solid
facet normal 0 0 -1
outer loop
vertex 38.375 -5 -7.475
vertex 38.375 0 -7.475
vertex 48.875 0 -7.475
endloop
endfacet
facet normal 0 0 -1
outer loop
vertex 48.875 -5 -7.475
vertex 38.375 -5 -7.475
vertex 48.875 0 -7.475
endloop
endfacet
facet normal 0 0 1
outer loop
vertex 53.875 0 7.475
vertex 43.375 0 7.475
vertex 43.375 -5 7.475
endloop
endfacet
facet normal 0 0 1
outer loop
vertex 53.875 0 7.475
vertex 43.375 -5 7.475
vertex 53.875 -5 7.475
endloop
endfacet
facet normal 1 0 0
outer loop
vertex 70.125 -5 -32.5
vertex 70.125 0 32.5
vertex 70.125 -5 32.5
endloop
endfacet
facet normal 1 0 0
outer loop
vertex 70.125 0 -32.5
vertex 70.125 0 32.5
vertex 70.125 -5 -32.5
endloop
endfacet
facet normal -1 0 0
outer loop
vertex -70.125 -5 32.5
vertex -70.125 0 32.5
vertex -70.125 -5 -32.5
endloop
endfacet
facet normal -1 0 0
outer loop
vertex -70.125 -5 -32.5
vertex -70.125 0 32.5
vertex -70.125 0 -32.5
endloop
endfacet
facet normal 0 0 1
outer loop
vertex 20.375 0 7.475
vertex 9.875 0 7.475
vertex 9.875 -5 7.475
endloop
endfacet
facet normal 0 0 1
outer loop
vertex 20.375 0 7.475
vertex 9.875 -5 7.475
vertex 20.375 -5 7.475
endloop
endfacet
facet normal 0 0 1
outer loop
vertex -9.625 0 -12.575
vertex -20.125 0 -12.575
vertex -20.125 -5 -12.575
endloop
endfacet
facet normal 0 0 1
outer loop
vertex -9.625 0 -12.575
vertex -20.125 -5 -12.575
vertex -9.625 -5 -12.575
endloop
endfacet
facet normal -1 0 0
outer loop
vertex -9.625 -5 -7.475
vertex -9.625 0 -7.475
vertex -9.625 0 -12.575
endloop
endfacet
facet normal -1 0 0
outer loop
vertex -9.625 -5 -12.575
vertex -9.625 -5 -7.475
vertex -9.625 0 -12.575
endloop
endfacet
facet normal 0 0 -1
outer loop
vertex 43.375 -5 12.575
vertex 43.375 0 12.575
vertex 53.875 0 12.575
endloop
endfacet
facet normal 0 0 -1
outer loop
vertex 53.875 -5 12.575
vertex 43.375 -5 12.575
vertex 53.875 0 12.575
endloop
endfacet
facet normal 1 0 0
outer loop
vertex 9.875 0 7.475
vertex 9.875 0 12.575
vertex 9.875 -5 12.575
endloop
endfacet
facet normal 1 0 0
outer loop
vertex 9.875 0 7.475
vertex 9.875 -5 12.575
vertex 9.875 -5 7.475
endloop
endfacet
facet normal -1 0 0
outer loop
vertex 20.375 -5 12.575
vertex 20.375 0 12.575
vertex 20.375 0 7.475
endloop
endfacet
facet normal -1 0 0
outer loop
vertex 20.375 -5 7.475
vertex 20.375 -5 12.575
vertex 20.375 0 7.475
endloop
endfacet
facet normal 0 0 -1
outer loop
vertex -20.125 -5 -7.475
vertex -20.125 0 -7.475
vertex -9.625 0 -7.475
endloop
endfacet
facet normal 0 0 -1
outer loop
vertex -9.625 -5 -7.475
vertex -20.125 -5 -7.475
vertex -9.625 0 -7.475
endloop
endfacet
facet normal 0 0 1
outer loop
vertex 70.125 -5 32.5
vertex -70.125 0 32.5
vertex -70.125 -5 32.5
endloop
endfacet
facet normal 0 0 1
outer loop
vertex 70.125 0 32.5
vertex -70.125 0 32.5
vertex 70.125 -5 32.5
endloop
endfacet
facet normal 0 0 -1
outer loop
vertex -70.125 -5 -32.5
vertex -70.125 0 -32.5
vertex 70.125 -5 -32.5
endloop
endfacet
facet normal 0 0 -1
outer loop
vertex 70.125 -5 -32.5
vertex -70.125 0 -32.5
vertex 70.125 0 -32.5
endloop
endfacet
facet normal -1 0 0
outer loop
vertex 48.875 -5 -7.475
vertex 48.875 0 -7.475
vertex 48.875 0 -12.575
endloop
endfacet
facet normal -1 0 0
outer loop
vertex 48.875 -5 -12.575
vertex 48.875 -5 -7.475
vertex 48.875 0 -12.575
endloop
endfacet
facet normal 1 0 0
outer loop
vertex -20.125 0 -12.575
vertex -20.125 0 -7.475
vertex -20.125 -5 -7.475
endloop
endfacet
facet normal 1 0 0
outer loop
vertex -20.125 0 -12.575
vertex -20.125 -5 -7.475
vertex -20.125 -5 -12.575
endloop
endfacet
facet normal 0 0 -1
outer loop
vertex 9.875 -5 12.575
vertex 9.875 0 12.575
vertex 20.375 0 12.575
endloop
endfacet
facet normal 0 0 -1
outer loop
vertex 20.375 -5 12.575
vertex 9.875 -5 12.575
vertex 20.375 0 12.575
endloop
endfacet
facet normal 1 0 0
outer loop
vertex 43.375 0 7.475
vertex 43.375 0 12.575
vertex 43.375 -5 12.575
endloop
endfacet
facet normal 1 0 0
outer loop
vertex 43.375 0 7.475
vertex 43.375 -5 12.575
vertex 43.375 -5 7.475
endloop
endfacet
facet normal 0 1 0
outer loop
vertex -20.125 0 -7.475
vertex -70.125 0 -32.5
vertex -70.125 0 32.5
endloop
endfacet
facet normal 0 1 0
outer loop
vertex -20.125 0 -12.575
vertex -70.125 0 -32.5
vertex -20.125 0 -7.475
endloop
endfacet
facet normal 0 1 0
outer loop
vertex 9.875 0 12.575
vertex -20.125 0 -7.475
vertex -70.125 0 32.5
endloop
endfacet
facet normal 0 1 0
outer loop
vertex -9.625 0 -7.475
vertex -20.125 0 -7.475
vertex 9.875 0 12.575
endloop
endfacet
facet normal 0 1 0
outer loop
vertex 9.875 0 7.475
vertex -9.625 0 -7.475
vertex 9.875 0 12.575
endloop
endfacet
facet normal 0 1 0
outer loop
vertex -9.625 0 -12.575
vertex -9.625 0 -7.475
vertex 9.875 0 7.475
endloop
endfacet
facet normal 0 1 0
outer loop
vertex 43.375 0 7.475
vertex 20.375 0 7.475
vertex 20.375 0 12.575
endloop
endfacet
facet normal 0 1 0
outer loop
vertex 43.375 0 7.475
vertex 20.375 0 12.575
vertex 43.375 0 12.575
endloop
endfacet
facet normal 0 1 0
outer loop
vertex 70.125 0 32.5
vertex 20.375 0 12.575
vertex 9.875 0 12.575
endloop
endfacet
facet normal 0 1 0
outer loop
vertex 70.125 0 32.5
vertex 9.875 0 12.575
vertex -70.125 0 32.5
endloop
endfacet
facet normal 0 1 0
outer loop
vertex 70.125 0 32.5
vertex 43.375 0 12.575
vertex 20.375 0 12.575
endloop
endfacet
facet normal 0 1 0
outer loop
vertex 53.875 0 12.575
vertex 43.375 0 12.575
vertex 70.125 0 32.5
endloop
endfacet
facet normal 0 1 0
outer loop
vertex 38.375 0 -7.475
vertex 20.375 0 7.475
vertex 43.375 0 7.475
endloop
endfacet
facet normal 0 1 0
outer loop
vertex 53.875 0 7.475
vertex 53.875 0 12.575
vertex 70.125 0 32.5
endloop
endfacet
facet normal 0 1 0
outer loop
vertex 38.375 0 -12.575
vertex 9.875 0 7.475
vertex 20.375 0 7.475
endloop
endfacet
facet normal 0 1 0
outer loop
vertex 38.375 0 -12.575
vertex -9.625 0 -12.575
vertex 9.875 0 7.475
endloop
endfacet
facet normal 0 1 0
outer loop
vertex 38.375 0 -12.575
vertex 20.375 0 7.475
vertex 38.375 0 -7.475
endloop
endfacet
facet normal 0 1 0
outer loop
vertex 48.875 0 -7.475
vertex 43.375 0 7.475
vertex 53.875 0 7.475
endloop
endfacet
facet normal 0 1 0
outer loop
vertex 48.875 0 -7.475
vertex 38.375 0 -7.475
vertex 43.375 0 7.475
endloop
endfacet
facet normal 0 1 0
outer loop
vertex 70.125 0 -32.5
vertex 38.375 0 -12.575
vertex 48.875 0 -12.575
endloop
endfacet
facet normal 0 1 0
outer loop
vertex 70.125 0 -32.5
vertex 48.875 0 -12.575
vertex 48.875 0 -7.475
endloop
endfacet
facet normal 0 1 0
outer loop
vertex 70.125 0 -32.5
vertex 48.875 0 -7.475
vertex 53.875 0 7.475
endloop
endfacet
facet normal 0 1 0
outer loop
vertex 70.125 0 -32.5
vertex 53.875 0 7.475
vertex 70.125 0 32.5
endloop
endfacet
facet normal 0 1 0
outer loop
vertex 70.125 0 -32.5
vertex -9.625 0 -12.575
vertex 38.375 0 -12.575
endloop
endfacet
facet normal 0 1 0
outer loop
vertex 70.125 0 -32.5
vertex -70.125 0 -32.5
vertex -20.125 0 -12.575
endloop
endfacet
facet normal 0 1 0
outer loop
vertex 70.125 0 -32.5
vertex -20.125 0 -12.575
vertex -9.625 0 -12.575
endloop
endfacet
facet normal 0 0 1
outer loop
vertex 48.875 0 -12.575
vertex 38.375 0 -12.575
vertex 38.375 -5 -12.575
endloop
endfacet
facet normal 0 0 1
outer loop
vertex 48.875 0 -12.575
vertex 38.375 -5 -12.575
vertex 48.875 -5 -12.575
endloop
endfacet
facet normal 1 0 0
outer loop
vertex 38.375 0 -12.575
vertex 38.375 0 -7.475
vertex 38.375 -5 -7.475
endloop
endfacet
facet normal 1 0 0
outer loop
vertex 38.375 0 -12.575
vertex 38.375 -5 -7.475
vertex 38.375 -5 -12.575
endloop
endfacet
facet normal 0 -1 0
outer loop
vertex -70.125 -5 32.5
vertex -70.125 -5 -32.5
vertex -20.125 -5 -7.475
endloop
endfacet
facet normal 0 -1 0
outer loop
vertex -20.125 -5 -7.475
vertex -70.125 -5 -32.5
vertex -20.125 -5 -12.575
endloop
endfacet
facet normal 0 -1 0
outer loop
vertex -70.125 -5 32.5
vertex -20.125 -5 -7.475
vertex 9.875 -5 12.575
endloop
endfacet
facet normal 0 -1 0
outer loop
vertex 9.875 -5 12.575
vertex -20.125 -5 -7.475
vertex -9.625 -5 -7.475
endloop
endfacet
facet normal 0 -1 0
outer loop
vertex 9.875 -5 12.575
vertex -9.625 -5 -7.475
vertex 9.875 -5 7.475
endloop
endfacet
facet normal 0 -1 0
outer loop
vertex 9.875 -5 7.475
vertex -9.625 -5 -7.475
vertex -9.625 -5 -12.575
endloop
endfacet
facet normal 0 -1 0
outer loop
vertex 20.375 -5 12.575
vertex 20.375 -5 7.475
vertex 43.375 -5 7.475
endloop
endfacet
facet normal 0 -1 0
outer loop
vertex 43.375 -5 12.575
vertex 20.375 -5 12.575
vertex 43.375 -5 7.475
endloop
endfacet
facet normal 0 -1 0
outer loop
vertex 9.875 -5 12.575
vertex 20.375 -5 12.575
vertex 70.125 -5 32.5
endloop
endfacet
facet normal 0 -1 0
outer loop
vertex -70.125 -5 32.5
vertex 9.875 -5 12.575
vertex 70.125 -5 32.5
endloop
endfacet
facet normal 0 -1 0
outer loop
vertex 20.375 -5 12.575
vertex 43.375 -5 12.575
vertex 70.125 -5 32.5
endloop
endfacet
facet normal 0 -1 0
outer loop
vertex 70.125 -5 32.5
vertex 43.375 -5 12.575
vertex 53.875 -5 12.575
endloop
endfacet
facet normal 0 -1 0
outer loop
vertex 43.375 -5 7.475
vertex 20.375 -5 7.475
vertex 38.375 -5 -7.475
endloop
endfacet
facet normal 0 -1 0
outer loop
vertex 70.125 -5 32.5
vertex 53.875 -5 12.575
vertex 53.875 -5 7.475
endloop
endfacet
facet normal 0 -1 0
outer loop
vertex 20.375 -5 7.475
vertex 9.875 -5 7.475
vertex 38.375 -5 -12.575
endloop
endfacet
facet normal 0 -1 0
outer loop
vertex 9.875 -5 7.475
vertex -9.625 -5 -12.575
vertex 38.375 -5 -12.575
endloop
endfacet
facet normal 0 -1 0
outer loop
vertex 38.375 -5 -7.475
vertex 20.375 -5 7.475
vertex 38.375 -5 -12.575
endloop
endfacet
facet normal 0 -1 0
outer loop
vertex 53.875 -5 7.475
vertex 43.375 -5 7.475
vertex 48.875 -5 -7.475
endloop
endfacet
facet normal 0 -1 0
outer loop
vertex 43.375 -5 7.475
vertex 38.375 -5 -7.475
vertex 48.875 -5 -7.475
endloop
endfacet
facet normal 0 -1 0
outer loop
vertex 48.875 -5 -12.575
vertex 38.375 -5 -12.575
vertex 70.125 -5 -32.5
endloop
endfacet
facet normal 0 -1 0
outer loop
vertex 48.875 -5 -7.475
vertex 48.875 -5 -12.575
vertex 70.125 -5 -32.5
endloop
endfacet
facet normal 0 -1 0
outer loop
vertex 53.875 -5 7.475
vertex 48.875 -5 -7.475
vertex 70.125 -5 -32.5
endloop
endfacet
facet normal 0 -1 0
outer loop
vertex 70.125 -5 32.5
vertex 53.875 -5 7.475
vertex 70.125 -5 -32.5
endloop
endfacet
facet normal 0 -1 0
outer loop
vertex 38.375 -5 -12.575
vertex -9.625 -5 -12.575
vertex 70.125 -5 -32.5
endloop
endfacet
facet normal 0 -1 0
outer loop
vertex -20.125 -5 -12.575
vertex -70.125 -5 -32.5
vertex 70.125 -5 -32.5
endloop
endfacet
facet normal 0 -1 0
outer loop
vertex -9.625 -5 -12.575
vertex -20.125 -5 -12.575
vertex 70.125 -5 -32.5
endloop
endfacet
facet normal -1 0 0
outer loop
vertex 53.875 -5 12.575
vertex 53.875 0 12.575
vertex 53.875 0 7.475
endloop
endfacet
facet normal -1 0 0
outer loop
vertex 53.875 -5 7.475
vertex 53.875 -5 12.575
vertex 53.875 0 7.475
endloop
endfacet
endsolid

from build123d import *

# Parameters (mm, degrees)
SKETCH1_W          = 140.25
SKETCH1_H          = 65
SKETCH1_W_2        = 10.5
SKETCH1_H_2        = 5.1
BASE_FLANGE1_DEPTH = 5


# Sheet-metal steps are written as plain solids
with BuildPart() as part:
    # Sketch1 → Base-Flange1 (new body)
    with BuildSketch(Plane(origin=(0, 0, 0), x_dir=(1, 0, 0), z_dir=(0, 1, 0))):
        Rectangle(SKETCH1_W, SKETCH1_H)
        with Locations((-14.875, 10.025)):
            Rectangle(SKETCH1_W_2, SKETCH1_H_2, mode=Mode.SUBTRACT)
        with Locations((43.625, 10.025)):
            Rectangle(SKETCH1_W_2, SKETCH1_H_2, mode=Mode.SUBTRACT)
        with Locations((15.125, -10.025)):
            Rectangle(SKETCH1_W_2, SKETCH1_H_2, mode=Mode.SUBTRACT)
        with Locations((48.625, -10.025)):
            Rectangle(SKETCH1_W_2, SKETCH1_H_2, mode=Mode.SUBTRACT)
    extrude(amount=-BASE_FLANGE1_DEPTH)


solid = part.part
